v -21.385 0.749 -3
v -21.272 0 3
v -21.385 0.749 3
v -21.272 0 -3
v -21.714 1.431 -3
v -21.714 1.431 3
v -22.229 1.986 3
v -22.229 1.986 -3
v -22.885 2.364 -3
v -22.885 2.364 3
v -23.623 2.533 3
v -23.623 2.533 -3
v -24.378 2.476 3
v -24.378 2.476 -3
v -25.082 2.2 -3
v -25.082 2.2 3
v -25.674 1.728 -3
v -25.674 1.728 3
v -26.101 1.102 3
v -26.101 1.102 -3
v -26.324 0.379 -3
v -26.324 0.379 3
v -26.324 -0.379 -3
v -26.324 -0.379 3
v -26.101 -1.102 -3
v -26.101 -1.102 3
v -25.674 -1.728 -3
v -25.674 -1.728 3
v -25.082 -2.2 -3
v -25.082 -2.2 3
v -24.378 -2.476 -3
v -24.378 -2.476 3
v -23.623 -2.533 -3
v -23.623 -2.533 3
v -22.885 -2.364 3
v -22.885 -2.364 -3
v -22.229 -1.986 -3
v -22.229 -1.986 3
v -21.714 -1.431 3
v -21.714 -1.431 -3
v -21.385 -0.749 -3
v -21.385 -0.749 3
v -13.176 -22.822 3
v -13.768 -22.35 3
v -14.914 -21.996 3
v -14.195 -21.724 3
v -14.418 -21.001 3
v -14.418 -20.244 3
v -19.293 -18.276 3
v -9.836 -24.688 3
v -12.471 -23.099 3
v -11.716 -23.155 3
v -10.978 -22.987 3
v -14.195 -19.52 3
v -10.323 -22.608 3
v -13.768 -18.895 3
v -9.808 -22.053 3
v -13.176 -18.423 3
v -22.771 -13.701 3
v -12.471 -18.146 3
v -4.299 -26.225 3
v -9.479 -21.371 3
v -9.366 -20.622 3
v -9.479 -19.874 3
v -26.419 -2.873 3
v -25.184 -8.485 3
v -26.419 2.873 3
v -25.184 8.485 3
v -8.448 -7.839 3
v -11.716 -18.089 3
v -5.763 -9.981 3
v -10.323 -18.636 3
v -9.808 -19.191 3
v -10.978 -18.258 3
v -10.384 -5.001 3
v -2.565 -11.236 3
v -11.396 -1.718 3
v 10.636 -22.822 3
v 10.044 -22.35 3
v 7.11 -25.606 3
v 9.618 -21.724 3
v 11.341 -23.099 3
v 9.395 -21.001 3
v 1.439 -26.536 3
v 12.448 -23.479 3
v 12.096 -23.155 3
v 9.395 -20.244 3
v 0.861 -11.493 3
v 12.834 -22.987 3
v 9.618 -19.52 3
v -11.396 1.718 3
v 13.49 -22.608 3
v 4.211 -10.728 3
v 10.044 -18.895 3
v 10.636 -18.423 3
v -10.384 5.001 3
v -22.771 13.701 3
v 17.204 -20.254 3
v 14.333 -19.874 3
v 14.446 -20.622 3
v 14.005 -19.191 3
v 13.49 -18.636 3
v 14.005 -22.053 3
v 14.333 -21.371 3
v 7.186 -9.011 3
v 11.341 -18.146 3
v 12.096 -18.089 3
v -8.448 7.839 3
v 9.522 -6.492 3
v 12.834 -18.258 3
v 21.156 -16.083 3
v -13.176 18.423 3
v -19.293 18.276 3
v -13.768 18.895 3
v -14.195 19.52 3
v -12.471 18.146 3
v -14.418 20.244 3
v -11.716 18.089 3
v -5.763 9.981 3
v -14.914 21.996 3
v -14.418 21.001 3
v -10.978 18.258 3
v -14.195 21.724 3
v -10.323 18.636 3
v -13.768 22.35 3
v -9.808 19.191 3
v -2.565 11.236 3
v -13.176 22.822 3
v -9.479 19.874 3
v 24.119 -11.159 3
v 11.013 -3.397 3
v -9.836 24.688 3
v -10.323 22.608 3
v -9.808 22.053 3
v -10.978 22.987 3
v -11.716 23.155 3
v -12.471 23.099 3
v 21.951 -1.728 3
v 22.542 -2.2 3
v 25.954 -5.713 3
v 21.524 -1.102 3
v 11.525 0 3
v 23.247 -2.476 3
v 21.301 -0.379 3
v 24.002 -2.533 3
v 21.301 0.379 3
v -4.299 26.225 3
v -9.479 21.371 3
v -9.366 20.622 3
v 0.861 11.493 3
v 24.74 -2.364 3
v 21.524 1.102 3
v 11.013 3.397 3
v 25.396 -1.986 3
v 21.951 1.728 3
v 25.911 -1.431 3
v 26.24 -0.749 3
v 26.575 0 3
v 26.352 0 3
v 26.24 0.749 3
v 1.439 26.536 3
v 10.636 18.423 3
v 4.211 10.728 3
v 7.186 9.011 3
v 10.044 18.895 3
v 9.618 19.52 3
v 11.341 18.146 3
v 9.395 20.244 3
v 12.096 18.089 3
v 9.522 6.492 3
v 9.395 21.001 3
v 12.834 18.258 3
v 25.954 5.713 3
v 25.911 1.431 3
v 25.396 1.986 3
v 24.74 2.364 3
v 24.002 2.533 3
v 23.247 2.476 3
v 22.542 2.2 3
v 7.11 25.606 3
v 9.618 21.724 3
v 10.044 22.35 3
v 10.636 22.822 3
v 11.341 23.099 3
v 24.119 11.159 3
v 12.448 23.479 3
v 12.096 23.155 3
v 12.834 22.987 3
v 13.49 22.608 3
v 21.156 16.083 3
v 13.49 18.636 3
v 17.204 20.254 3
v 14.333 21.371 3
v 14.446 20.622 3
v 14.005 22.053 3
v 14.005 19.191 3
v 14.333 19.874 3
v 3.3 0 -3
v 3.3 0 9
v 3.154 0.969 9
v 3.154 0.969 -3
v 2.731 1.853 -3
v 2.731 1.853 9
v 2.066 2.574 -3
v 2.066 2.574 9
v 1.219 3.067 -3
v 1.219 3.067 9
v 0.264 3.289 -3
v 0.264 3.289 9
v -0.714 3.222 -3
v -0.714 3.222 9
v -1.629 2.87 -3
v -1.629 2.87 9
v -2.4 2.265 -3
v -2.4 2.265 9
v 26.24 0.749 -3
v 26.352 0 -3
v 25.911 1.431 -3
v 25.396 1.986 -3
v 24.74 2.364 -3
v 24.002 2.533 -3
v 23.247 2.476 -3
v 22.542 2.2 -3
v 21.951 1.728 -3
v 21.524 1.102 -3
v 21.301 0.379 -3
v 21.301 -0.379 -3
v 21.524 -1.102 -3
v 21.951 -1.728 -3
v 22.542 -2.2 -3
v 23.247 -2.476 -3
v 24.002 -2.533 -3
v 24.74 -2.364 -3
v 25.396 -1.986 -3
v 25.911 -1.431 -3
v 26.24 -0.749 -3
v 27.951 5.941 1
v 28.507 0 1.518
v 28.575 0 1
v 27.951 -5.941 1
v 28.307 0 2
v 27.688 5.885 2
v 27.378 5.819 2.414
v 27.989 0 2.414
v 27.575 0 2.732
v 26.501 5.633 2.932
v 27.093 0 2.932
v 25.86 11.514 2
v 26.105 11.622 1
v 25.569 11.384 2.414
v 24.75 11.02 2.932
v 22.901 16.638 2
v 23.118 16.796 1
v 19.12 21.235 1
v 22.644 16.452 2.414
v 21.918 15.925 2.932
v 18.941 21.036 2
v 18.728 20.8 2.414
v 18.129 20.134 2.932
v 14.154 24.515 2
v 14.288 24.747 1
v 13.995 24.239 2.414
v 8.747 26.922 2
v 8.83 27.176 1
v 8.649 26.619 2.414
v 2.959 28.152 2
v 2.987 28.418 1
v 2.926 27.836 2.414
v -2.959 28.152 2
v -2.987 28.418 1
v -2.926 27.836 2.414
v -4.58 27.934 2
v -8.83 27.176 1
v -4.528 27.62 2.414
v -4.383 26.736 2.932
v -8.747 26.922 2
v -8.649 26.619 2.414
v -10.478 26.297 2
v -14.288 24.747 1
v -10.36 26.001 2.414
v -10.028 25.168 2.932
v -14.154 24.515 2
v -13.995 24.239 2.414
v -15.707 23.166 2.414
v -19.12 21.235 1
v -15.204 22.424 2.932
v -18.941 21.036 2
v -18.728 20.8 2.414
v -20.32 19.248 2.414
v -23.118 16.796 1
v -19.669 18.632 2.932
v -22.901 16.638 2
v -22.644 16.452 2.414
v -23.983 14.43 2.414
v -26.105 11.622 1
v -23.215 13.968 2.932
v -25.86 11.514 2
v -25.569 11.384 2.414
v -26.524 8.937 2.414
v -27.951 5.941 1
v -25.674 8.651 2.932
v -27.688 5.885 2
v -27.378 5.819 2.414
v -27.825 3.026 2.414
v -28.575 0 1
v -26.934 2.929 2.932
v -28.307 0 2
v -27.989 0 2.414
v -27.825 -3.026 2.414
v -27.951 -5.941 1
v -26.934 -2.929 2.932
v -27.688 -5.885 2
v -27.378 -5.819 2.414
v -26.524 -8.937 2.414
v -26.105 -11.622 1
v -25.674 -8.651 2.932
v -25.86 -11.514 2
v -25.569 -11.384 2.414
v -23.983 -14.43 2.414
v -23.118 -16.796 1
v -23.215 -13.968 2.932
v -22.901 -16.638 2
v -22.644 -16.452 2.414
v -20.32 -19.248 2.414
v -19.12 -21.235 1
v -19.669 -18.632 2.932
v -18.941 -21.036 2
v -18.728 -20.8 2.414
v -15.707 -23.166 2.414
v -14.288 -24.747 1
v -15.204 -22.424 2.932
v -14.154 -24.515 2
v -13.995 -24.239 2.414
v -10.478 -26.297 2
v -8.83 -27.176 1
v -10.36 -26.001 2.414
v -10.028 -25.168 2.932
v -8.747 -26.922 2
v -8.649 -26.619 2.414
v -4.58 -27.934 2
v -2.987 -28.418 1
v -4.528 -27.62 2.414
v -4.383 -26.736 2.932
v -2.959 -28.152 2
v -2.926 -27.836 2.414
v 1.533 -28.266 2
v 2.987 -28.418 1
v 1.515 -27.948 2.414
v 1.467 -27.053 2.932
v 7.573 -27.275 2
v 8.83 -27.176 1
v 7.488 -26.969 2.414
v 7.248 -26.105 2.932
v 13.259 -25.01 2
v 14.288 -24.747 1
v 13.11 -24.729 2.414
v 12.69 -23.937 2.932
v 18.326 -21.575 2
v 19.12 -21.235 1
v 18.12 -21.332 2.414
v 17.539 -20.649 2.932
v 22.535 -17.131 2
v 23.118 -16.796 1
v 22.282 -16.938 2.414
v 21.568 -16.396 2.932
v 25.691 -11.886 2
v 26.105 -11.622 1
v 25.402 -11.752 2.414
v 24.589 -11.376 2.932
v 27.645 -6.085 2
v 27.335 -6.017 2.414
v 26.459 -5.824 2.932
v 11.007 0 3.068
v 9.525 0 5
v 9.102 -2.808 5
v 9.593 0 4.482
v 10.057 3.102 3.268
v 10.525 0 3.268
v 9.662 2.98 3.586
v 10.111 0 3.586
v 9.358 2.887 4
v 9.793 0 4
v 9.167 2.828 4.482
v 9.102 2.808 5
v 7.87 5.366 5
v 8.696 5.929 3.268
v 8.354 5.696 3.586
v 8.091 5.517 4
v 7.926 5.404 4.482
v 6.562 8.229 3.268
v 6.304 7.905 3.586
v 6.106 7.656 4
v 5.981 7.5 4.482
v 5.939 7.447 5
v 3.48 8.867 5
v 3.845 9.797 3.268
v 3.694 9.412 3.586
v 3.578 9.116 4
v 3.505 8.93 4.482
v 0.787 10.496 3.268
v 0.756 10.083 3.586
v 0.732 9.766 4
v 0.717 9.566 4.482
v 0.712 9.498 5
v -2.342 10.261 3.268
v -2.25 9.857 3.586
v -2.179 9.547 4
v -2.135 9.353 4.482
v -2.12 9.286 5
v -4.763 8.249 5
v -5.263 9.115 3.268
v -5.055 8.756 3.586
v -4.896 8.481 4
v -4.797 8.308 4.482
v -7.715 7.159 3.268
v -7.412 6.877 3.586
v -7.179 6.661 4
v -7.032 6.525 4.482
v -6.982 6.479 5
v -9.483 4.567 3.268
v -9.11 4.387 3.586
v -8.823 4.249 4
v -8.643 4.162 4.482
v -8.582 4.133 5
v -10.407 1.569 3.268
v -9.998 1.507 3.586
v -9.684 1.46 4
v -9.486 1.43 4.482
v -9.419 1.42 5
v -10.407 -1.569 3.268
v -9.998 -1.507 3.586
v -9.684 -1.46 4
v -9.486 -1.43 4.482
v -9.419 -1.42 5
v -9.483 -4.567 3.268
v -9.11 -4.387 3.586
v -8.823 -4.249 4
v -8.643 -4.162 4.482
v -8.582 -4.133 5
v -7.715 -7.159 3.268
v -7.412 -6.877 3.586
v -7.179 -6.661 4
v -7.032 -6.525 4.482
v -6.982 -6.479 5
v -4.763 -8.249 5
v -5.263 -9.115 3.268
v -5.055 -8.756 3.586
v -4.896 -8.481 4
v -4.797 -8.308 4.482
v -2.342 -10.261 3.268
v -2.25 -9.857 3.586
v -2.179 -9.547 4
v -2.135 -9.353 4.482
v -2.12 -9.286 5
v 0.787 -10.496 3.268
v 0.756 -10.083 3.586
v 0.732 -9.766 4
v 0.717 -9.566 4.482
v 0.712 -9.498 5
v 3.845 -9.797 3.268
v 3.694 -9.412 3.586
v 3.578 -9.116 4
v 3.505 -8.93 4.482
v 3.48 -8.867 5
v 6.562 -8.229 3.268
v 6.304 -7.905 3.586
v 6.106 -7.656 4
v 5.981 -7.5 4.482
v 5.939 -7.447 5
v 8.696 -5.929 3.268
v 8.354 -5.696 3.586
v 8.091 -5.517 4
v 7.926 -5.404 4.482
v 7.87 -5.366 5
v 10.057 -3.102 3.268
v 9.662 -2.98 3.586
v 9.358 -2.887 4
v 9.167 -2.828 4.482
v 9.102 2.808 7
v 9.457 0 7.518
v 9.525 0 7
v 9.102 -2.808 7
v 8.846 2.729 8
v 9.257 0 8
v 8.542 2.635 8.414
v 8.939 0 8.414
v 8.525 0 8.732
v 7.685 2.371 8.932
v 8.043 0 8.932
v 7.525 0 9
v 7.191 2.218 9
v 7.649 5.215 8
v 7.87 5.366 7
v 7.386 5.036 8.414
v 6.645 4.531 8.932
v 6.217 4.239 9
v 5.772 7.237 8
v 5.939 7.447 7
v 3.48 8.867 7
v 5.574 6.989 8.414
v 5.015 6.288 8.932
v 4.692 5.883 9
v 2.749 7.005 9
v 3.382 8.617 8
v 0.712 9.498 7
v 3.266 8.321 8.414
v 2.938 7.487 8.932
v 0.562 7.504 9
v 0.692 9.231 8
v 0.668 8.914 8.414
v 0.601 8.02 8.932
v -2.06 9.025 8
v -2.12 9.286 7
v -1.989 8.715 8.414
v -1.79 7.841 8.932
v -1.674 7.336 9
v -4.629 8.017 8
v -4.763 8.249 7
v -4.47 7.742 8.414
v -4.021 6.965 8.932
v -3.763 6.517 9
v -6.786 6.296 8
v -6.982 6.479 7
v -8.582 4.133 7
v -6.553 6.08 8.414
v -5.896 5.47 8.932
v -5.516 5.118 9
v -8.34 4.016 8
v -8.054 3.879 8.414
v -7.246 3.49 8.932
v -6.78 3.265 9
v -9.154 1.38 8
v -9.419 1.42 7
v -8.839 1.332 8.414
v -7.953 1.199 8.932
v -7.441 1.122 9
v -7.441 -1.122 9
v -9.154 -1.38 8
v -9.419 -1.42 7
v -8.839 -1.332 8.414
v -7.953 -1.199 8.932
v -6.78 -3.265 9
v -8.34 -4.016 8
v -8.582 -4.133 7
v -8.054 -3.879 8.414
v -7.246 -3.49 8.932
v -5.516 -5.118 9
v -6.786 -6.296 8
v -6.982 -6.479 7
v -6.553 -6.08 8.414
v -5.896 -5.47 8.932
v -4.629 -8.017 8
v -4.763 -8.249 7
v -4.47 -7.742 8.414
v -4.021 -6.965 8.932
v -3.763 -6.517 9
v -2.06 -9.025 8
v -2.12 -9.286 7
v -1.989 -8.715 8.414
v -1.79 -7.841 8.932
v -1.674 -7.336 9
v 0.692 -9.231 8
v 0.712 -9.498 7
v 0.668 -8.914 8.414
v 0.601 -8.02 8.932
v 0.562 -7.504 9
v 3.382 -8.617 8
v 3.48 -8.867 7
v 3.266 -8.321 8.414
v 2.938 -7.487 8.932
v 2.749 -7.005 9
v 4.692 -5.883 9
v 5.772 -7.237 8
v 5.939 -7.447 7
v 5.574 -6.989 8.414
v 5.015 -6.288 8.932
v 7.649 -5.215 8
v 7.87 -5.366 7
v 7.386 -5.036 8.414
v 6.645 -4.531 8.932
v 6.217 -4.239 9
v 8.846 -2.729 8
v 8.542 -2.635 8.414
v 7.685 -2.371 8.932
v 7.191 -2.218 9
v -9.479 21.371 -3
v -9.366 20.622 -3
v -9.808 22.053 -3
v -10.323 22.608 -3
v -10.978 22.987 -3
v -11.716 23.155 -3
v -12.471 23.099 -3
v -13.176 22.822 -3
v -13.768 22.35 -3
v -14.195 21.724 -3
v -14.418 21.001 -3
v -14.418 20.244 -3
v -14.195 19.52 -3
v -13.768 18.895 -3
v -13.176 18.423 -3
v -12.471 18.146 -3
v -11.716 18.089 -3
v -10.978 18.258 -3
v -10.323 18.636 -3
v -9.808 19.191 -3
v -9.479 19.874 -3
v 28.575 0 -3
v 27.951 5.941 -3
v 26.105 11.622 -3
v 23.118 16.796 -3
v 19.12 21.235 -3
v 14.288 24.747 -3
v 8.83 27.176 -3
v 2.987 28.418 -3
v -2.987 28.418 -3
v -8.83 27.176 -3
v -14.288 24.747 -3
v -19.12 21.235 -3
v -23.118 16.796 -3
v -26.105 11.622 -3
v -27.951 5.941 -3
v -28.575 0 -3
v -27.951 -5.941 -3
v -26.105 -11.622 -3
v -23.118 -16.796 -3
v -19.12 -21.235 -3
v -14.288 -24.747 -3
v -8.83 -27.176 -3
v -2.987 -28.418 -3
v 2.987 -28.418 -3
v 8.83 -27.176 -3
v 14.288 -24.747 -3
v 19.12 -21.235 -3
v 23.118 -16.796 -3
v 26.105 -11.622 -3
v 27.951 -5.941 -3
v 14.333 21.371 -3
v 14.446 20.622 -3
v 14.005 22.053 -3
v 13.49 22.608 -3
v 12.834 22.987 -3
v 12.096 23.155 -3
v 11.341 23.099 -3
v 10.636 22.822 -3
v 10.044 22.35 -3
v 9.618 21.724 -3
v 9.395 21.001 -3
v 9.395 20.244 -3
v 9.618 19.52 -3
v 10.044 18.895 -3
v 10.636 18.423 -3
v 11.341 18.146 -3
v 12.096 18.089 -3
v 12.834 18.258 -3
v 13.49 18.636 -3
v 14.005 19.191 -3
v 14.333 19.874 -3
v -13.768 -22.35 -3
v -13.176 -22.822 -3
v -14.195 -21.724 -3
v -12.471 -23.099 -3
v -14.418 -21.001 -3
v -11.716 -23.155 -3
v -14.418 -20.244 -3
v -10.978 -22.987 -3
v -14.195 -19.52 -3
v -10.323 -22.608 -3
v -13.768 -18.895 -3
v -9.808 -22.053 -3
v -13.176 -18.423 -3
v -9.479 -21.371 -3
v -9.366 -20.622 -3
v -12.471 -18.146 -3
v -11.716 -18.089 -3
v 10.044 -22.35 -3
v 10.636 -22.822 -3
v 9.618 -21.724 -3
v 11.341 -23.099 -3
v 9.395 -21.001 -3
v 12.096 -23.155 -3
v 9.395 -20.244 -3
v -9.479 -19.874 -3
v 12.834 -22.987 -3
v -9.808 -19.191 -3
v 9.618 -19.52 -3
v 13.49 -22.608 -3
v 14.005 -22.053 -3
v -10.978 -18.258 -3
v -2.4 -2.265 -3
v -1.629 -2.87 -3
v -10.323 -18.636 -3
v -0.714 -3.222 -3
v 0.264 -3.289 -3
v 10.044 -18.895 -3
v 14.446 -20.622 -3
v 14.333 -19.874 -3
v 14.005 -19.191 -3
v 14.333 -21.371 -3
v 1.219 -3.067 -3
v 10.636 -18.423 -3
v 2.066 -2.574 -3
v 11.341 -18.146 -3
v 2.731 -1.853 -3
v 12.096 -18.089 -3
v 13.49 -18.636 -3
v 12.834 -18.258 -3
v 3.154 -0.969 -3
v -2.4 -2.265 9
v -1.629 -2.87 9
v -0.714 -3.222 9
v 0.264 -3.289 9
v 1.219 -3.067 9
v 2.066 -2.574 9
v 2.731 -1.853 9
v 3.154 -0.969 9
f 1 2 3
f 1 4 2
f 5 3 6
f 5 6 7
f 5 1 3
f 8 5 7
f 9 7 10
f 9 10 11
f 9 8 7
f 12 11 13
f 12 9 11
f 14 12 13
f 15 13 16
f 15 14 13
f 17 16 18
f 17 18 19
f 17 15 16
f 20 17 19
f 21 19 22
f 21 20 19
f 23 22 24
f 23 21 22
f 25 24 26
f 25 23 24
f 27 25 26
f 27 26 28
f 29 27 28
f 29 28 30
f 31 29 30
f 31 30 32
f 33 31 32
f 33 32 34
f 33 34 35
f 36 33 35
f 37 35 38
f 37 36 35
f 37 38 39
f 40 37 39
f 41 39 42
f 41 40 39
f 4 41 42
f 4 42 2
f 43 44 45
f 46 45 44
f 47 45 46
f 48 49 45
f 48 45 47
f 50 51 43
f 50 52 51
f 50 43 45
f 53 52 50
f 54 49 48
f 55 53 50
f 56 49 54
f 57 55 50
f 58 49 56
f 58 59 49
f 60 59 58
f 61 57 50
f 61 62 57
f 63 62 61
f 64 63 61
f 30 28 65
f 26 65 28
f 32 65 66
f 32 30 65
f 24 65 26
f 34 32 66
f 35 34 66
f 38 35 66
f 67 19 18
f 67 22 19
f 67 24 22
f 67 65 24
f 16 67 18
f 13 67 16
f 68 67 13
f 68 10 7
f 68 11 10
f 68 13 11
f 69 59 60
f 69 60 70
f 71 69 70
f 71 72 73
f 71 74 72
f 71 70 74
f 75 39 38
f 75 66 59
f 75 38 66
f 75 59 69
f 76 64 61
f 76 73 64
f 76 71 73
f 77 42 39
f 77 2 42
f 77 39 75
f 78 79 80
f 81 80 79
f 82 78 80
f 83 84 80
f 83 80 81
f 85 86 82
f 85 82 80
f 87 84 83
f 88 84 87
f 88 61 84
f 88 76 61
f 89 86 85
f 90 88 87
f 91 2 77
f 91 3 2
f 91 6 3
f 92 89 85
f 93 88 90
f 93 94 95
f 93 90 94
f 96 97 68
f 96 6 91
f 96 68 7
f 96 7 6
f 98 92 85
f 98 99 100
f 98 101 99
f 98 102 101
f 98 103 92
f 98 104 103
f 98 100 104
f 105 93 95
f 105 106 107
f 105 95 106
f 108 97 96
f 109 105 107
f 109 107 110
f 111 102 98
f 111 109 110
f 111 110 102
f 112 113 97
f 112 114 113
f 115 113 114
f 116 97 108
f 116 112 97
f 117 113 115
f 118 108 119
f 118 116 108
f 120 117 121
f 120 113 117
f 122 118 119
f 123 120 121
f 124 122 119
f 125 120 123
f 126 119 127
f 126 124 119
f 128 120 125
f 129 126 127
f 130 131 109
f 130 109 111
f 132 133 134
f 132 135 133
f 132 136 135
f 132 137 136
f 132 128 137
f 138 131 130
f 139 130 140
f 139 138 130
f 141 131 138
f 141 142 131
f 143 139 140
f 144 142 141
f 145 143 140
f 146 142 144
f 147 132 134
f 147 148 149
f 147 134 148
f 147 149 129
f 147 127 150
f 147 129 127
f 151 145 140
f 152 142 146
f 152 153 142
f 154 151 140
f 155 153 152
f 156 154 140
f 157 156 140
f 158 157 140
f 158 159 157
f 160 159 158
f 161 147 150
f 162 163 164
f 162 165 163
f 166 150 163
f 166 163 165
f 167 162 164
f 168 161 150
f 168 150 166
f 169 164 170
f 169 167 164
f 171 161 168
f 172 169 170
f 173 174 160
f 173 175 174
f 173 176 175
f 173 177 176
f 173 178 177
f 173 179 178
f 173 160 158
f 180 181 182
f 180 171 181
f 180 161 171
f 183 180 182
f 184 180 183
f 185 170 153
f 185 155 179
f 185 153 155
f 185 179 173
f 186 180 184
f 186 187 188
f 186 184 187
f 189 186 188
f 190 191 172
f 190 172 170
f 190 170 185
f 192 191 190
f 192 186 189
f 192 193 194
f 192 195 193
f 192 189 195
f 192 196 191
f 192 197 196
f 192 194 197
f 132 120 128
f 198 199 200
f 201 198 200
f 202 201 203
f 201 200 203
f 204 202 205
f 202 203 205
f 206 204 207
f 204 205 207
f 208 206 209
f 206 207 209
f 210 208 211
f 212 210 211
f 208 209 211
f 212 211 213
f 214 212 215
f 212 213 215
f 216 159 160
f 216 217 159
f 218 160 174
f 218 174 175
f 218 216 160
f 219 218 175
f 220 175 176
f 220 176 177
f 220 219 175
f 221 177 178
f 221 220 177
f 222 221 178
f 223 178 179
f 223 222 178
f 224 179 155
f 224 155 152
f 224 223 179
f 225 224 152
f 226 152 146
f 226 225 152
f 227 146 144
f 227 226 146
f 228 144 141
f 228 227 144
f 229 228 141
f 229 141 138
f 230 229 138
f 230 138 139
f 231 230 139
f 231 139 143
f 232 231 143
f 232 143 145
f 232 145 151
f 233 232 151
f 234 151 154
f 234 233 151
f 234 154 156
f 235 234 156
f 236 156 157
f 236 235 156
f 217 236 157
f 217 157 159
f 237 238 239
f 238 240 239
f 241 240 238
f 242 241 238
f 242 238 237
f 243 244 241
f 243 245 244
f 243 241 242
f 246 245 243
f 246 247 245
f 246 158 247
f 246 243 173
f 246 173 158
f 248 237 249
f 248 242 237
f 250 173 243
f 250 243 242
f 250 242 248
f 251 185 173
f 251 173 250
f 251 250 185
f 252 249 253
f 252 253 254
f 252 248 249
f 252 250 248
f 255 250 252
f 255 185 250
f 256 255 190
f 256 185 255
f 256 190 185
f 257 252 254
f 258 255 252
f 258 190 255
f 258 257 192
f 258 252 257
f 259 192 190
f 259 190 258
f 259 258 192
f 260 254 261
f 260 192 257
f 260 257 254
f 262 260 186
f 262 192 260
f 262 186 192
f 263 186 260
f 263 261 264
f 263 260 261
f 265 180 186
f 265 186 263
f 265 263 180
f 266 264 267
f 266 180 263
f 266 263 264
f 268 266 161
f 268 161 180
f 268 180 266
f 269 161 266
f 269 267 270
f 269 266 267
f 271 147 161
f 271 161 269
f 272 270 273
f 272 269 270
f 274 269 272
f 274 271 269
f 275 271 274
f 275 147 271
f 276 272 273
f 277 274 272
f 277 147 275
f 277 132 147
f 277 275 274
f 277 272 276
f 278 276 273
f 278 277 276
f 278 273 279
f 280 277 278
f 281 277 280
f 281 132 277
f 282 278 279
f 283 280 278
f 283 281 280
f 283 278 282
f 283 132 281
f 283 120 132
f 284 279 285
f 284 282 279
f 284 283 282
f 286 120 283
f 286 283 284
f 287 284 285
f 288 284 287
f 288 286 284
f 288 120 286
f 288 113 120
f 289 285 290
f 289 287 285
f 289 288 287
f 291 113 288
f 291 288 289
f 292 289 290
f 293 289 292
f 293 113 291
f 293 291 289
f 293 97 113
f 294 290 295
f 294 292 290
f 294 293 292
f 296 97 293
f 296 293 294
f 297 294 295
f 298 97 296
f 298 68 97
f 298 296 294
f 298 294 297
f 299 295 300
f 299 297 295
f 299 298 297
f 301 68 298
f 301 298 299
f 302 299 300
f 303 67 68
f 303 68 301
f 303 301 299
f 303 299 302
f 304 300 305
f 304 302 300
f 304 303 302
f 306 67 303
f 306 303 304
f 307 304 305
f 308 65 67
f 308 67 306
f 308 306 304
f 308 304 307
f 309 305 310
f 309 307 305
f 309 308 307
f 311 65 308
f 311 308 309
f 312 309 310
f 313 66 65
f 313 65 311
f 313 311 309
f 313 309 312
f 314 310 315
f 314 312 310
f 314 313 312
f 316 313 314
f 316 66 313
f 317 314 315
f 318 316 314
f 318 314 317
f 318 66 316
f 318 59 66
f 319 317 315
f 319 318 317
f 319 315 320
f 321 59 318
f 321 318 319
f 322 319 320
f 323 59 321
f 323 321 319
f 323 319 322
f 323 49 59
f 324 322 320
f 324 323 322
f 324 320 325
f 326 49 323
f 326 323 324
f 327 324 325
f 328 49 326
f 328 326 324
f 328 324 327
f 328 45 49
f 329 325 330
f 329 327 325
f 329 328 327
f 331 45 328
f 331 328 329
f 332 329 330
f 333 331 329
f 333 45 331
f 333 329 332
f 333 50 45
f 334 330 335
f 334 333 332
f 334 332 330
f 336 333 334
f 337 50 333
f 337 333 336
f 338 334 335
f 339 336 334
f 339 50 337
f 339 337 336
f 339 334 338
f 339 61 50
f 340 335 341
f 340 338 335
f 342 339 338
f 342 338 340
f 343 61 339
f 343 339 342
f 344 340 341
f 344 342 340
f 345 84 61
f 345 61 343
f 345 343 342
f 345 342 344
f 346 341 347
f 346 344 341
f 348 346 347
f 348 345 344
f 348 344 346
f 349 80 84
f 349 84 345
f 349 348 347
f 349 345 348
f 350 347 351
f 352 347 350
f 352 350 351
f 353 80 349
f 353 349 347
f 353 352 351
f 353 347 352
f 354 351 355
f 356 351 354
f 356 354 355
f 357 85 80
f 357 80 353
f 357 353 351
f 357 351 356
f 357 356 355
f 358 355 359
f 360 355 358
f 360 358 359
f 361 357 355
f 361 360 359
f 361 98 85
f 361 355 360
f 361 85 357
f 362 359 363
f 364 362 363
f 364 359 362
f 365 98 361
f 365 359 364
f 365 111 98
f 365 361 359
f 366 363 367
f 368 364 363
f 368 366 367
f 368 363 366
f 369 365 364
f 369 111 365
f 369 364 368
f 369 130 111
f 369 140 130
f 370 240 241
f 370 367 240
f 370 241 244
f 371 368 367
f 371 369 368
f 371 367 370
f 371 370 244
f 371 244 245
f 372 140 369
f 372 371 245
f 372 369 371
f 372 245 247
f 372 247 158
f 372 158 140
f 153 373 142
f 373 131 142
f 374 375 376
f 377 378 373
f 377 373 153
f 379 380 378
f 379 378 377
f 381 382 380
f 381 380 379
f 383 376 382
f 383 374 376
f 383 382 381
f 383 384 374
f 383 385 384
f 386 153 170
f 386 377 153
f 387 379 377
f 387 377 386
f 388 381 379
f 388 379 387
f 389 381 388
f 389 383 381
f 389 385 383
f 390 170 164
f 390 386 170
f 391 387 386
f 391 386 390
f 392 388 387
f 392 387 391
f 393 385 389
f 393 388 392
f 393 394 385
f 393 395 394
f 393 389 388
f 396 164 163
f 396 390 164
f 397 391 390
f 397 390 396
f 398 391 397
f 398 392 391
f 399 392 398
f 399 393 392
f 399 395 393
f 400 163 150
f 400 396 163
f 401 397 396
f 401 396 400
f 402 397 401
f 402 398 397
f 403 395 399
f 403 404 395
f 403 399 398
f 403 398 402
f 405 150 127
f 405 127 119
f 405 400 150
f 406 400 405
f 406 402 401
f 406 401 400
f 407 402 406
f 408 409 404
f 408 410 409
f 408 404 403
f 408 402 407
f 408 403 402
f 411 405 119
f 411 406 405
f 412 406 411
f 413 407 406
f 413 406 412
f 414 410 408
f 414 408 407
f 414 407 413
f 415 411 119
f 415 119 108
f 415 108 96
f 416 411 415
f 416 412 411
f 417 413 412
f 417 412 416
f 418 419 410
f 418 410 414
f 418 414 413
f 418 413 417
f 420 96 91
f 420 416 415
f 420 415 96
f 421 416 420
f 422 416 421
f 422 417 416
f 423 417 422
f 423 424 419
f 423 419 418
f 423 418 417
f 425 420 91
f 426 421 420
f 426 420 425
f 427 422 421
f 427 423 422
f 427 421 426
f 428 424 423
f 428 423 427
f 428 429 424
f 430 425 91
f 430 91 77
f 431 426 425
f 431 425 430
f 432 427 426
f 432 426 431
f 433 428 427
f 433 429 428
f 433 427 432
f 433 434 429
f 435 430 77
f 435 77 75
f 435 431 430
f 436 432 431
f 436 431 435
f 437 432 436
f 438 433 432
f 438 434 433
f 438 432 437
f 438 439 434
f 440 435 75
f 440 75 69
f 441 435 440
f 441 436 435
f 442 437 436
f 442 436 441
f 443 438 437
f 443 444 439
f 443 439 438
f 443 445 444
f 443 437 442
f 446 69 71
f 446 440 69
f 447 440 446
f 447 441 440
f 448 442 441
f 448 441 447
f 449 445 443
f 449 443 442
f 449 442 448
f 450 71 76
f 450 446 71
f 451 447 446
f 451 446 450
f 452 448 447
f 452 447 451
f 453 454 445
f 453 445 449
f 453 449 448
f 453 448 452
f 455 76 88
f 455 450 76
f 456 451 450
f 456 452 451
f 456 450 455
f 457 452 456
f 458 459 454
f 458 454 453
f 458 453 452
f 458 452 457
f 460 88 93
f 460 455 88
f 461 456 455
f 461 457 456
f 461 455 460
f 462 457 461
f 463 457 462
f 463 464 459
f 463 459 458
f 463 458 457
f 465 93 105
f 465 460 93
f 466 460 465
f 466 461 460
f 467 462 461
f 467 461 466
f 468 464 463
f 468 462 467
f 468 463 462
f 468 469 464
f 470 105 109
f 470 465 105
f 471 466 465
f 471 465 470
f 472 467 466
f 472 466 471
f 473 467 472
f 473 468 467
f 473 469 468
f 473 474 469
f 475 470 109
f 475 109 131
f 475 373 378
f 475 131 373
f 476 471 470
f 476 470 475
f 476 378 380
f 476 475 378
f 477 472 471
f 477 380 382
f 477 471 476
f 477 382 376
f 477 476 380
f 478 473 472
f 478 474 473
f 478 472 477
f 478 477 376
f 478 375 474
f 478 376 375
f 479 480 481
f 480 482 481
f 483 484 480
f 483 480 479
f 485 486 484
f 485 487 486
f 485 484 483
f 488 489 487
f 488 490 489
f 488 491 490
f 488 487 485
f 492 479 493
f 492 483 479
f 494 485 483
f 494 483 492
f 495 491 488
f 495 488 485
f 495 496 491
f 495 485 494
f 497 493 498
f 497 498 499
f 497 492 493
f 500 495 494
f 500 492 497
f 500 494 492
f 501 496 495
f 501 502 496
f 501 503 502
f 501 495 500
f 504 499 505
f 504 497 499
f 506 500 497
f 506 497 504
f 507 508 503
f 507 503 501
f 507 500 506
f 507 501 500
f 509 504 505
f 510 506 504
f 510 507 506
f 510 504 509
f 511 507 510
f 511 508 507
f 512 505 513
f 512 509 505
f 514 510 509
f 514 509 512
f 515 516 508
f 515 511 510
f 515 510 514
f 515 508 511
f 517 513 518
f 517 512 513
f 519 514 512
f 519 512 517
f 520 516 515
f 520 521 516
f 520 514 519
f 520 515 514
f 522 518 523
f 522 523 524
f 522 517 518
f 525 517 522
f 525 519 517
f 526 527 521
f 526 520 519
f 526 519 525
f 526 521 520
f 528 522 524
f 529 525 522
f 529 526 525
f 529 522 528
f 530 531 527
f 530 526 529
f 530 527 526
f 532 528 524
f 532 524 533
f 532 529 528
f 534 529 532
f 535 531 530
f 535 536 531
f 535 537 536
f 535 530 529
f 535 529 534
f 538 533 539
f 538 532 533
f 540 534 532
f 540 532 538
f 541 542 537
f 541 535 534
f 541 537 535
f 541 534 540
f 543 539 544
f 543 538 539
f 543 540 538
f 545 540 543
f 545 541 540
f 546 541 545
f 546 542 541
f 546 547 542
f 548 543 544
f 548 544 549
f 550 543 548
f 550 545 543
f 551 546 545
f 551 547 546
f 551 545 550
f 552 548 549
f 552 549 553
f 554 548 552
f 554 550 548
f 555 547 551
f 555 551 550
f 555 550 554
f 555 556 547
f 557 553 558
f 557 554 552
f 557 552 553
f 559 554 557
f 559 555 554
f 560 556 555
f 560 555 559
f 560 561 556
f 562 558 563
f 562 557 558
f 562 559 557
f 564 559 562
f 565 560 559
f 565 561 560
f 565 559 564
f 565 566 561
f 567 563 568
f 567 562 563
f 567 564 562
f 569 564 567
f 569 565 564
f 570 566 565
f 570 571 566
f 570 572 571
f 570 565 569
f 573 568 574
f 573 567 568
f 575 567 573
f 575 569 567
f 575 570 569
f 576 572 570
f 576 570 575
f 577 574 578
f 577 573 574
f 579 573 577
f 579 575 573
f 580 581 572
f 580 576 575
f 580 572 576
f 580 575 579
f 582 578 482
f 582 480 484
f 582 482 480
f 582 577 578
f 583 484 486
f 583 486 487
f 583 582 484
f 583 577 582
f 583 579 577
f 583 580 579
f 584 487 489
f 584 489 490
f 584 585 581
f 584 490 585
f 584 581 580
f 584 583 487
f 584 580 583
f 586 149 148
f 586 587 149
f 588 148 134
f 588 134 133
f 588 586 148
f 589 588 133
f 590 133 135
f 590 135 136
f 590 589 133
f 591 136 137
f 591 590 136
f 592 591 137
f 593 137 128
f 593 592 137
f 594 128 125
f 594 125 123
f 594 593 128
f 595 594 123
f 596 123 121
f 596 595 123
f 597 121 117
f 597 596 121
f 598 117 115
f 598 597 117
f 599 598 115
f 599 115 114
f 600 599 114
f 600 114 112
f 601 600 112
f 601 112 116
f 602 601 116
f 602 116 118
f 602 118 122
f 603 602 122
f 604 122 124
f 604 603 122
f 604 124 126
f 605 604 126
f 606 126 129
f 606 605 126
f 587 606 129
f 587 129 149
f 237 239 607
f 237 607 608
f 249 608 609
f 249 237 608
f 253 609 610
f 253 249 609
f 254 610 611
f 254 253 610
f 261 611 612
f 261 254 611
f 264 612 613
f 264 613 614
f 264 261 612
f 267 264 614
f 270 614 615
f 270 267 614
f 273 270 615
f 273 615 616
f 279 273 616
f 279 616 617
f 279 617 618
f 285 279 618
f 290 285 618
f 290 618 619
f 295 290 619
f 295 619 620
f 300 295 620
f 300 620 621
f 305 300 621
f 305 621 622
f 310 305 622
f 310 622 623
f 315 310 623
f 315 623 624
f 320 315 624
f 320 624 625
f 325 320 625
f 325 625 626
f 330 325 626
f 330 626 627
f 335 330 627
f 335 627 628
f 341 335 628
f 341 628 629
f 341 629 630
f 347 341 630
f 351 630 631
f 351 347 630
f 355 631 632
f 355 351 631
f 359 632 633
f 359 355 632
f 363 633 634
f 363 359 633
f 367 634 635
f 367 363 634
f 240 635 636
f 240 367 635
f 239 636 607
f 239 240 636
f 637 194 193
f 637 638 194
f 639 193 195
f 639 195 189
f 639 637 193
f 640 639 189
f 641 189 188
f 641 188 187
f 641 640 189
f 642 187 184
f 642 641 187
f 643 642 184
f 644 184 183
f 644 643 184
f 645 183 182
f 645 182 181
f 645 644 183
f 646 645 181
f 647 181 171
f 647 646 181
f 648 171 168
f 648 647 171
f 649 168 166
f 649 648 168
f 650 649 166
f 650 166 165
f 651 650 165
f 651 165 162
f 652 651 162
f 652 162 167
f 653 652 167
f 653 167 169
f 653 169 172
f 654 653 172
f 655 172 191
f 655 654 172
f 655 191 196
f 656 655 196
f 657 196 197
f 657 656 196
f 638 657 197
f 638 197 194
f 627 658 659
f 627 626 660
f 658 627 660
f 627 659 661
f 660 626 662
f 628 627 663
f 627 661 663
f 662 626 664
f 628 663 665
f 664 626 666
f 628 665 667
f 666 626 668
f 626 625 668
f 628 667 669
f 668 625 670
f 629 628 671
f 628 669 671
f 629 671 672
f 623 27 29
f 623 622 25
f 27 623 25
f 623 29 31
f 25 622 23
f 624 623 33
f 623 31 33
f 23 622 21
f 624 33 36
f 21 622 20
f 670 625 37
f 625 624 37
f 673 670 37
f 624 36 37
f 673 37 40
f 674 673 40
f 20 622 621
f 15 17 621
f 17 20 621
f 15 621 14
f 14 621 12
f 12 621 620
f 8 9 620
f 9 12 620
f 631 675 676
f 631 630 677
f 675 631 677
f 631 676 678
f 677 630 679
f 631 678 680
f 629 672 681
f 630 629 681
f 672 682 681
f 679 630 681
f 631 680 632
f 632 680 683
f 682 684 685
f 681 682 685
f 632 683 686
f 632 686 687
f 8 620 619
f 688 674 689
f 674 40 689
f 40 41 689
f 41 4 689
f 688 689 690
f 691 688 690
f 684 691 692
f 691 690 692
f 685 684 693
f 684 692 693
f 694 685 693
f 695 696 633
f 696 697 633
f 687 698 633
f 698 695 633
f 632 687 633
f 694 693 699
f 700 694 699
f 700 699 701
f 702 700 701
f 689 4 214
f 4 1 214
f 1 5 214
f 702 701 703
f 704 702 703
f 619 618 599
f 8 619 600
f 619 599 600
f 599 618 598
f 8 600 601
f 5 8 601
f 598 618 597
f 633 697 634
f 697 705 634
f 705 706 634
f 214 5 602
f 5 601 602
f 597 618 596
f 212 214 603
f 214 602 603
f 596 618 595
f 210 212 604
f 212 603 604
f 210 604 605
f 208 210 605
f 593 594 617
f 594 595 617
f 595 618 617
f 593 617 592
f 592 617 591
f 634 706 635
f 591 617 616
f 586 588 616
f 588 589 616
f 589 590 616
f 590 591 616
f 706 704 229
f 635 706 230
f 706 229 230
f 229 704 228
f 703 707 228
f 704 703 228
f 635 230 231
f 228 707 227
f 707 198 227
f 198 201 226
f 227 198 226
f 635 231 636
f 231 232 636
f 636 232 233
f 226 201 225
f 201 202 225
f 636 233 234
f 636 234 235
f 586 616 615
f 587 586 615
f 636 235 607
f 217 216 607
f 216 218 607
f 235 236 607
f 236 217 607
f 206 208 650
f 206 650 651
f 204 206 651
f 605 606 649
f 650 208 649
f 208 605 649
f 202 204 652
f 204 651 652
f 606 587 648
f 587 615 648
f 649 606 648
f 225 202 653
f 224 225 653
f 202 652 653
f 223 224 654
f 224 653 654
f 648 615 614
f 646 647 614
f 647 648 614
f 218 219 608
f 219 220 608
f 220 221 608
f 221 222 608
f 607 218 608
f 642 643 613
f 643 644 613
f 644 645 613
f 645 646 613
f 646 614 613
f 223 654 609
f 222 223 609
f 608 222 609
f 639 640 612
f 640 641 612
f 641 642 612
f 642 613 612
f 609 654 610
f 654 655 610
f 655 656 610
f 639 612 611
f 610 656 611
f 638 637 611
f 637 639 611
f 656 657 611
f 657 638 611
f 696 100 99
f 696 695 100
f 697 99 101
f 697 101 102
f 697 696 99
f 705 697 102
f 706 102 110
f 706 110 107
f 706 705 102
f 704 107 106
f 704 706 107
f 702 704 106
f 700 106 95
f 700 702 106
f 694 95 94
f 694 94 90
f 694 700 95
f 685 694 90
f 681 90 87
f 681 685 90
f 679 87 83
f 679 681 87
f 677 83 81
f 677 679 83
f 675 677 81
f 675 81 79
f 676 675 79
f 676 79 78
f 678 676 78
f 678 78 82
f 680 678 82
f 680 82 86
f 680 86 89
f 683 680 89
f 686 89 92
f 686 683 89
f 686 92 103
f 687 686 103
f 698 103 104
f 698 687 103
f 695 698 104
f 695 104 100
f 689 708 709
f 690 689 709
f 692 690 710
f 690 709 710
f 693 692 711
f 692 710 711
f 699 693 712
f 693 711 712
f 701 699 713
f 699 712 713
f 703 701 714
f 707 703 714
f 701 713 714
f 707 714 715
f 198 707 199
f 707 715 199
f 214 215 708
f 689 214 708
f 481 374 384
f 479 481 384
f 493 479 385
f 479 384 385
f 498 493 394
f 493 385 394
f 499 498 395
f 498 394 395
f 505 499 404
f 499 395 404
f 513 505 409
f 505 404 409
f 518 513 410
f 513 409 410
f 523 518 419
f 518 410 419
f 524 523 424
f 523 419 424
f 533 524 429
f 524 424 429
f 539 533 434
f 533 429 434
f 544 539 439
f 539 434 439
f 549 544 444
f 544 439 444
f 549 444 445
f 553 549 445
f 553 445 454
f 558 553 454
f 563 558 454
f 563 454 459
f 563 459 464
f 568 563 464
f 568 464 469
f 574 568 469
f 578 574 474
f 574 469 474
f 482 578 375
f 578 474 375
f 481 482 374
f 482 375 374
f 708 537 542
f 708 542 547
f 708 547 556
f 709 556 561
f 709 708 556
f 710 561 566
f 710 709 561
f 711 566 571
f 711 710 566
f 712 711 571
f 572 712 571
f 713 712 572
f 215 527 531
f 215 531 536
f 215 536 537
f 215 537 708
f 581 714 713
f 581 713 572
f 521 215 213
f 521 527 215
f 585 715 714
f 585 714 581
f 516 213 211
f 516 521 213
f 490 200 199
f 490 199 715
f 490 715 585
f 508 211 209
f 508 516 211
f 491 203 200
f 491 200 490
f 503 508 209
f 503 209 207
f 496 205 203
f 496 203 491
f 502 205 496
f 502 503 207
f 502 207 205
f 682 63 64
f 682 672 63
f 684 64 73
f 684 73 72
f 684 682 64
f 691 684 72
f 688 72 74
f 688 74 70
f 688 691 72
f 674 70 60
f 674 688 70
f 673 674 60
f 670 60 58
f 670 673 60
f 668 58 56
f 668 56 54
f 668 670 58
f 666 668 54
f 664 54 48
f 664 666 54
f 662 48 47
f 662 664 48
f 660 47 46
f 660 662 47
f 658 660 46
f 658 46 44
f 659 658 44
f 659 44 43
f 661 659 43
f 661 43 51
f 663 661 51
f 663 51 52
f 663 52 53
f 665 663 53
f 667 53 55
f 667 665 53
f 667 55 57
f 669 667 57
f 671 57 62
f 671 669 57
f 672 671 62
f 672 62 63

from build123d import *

# Parameters (mm, degrees)
SKETCH1_R           = 28.575
SKETCH1_R_2         = 2.54
BOSS_EXTRUDE1_DEPTH = 3
SKETCH2_R           = 9.525
BOSS_EXTRUDE2_DEPTH = 6
CUT_EXTRUDE1_REACH  = 44.155
FILLET1_R           = 2


with BuildPart() as part:
    # Sketch1 → Boss-Extrude1 (new, symmetric)
    with BuildSketch(Plane.XY):
        Circle(SKETCH1_R)
        with Locations((-23.8125, 0)):
            Circle(SKETCH1_R_2, mode=Mode.SUBTRACT)
        with Locations((-11.90625, 20.622229928)):
            Circle(SKETCH1_R_2, mode=Mode.SUBTRACT)
        with Locations((11.90625, 20.622229928)):
            Circle(SKETCH1_R_2, mode=Mode.SUBTRACT)
        with Locations((23.8125, 0)):
            Circle(SKETCH1_R_2, mode=Mode.SUBTRACT)
        with Locations((11.90625, -20.622229928)):
            Circle(SKETCH1_R_2, mode=Mode.SUBTRACT)
        with Locations((-11.90625, -20.622229928)):
            Circle(SKETCH1_R_2, mode=Mode.SUBTRACT)
    extrude(amount=BOSS_EXTRUDE1_DEPTH, both=True)

    # Sketch2 → Boss-Extrude2 (add)
    with BuildSketch(Plane.XY.offset(3)):
        Circle(SKETCH2_R)
    extrude(amount=BOSS_EXTRUDE2_DEPTH)

    # Sketch3 → Cut-Extrude1 (cut, up to next)
    with BuildSketch(Plane.XY.offset(9), mode=Mode.PRIVATE) as cut_extrude1_sk1:
        with BuildLine():
            ThreePointArc((3.3, 0), (1.218605761, 3.066757245), (-2.4, 2.264950331))
            Line((-2.4, 2.264950331), (-2.4, -2.264950331))
            ThreePointArc((-2.4, -2.264950331), (1.218605761, -3.066757245), (3.3, 0))
        make_face()
    cut_extrude1_tool1 = extrude(cut_extrude1_sk1.sketch, amount=-CUT_EXTRUDE1_REACH, mode=Mode.PRIVATE) & part.part
    add(cut_extrude1_tool1.solids().sort_by_distance((0.246613, 0, 9))[0], mode=Mode.SUBTRACT)

    # Fillet1
    fillet1_edges = [part.edges().sort_by_distance(p)[0] for p in [
        (-9.525, 0, 3),
        (-9.525, 0, 9),
        (-28.575, 0, 3),
    ]]
    fillet(fillet1_edges, radius=FILLET1_R)


solid = part.part
